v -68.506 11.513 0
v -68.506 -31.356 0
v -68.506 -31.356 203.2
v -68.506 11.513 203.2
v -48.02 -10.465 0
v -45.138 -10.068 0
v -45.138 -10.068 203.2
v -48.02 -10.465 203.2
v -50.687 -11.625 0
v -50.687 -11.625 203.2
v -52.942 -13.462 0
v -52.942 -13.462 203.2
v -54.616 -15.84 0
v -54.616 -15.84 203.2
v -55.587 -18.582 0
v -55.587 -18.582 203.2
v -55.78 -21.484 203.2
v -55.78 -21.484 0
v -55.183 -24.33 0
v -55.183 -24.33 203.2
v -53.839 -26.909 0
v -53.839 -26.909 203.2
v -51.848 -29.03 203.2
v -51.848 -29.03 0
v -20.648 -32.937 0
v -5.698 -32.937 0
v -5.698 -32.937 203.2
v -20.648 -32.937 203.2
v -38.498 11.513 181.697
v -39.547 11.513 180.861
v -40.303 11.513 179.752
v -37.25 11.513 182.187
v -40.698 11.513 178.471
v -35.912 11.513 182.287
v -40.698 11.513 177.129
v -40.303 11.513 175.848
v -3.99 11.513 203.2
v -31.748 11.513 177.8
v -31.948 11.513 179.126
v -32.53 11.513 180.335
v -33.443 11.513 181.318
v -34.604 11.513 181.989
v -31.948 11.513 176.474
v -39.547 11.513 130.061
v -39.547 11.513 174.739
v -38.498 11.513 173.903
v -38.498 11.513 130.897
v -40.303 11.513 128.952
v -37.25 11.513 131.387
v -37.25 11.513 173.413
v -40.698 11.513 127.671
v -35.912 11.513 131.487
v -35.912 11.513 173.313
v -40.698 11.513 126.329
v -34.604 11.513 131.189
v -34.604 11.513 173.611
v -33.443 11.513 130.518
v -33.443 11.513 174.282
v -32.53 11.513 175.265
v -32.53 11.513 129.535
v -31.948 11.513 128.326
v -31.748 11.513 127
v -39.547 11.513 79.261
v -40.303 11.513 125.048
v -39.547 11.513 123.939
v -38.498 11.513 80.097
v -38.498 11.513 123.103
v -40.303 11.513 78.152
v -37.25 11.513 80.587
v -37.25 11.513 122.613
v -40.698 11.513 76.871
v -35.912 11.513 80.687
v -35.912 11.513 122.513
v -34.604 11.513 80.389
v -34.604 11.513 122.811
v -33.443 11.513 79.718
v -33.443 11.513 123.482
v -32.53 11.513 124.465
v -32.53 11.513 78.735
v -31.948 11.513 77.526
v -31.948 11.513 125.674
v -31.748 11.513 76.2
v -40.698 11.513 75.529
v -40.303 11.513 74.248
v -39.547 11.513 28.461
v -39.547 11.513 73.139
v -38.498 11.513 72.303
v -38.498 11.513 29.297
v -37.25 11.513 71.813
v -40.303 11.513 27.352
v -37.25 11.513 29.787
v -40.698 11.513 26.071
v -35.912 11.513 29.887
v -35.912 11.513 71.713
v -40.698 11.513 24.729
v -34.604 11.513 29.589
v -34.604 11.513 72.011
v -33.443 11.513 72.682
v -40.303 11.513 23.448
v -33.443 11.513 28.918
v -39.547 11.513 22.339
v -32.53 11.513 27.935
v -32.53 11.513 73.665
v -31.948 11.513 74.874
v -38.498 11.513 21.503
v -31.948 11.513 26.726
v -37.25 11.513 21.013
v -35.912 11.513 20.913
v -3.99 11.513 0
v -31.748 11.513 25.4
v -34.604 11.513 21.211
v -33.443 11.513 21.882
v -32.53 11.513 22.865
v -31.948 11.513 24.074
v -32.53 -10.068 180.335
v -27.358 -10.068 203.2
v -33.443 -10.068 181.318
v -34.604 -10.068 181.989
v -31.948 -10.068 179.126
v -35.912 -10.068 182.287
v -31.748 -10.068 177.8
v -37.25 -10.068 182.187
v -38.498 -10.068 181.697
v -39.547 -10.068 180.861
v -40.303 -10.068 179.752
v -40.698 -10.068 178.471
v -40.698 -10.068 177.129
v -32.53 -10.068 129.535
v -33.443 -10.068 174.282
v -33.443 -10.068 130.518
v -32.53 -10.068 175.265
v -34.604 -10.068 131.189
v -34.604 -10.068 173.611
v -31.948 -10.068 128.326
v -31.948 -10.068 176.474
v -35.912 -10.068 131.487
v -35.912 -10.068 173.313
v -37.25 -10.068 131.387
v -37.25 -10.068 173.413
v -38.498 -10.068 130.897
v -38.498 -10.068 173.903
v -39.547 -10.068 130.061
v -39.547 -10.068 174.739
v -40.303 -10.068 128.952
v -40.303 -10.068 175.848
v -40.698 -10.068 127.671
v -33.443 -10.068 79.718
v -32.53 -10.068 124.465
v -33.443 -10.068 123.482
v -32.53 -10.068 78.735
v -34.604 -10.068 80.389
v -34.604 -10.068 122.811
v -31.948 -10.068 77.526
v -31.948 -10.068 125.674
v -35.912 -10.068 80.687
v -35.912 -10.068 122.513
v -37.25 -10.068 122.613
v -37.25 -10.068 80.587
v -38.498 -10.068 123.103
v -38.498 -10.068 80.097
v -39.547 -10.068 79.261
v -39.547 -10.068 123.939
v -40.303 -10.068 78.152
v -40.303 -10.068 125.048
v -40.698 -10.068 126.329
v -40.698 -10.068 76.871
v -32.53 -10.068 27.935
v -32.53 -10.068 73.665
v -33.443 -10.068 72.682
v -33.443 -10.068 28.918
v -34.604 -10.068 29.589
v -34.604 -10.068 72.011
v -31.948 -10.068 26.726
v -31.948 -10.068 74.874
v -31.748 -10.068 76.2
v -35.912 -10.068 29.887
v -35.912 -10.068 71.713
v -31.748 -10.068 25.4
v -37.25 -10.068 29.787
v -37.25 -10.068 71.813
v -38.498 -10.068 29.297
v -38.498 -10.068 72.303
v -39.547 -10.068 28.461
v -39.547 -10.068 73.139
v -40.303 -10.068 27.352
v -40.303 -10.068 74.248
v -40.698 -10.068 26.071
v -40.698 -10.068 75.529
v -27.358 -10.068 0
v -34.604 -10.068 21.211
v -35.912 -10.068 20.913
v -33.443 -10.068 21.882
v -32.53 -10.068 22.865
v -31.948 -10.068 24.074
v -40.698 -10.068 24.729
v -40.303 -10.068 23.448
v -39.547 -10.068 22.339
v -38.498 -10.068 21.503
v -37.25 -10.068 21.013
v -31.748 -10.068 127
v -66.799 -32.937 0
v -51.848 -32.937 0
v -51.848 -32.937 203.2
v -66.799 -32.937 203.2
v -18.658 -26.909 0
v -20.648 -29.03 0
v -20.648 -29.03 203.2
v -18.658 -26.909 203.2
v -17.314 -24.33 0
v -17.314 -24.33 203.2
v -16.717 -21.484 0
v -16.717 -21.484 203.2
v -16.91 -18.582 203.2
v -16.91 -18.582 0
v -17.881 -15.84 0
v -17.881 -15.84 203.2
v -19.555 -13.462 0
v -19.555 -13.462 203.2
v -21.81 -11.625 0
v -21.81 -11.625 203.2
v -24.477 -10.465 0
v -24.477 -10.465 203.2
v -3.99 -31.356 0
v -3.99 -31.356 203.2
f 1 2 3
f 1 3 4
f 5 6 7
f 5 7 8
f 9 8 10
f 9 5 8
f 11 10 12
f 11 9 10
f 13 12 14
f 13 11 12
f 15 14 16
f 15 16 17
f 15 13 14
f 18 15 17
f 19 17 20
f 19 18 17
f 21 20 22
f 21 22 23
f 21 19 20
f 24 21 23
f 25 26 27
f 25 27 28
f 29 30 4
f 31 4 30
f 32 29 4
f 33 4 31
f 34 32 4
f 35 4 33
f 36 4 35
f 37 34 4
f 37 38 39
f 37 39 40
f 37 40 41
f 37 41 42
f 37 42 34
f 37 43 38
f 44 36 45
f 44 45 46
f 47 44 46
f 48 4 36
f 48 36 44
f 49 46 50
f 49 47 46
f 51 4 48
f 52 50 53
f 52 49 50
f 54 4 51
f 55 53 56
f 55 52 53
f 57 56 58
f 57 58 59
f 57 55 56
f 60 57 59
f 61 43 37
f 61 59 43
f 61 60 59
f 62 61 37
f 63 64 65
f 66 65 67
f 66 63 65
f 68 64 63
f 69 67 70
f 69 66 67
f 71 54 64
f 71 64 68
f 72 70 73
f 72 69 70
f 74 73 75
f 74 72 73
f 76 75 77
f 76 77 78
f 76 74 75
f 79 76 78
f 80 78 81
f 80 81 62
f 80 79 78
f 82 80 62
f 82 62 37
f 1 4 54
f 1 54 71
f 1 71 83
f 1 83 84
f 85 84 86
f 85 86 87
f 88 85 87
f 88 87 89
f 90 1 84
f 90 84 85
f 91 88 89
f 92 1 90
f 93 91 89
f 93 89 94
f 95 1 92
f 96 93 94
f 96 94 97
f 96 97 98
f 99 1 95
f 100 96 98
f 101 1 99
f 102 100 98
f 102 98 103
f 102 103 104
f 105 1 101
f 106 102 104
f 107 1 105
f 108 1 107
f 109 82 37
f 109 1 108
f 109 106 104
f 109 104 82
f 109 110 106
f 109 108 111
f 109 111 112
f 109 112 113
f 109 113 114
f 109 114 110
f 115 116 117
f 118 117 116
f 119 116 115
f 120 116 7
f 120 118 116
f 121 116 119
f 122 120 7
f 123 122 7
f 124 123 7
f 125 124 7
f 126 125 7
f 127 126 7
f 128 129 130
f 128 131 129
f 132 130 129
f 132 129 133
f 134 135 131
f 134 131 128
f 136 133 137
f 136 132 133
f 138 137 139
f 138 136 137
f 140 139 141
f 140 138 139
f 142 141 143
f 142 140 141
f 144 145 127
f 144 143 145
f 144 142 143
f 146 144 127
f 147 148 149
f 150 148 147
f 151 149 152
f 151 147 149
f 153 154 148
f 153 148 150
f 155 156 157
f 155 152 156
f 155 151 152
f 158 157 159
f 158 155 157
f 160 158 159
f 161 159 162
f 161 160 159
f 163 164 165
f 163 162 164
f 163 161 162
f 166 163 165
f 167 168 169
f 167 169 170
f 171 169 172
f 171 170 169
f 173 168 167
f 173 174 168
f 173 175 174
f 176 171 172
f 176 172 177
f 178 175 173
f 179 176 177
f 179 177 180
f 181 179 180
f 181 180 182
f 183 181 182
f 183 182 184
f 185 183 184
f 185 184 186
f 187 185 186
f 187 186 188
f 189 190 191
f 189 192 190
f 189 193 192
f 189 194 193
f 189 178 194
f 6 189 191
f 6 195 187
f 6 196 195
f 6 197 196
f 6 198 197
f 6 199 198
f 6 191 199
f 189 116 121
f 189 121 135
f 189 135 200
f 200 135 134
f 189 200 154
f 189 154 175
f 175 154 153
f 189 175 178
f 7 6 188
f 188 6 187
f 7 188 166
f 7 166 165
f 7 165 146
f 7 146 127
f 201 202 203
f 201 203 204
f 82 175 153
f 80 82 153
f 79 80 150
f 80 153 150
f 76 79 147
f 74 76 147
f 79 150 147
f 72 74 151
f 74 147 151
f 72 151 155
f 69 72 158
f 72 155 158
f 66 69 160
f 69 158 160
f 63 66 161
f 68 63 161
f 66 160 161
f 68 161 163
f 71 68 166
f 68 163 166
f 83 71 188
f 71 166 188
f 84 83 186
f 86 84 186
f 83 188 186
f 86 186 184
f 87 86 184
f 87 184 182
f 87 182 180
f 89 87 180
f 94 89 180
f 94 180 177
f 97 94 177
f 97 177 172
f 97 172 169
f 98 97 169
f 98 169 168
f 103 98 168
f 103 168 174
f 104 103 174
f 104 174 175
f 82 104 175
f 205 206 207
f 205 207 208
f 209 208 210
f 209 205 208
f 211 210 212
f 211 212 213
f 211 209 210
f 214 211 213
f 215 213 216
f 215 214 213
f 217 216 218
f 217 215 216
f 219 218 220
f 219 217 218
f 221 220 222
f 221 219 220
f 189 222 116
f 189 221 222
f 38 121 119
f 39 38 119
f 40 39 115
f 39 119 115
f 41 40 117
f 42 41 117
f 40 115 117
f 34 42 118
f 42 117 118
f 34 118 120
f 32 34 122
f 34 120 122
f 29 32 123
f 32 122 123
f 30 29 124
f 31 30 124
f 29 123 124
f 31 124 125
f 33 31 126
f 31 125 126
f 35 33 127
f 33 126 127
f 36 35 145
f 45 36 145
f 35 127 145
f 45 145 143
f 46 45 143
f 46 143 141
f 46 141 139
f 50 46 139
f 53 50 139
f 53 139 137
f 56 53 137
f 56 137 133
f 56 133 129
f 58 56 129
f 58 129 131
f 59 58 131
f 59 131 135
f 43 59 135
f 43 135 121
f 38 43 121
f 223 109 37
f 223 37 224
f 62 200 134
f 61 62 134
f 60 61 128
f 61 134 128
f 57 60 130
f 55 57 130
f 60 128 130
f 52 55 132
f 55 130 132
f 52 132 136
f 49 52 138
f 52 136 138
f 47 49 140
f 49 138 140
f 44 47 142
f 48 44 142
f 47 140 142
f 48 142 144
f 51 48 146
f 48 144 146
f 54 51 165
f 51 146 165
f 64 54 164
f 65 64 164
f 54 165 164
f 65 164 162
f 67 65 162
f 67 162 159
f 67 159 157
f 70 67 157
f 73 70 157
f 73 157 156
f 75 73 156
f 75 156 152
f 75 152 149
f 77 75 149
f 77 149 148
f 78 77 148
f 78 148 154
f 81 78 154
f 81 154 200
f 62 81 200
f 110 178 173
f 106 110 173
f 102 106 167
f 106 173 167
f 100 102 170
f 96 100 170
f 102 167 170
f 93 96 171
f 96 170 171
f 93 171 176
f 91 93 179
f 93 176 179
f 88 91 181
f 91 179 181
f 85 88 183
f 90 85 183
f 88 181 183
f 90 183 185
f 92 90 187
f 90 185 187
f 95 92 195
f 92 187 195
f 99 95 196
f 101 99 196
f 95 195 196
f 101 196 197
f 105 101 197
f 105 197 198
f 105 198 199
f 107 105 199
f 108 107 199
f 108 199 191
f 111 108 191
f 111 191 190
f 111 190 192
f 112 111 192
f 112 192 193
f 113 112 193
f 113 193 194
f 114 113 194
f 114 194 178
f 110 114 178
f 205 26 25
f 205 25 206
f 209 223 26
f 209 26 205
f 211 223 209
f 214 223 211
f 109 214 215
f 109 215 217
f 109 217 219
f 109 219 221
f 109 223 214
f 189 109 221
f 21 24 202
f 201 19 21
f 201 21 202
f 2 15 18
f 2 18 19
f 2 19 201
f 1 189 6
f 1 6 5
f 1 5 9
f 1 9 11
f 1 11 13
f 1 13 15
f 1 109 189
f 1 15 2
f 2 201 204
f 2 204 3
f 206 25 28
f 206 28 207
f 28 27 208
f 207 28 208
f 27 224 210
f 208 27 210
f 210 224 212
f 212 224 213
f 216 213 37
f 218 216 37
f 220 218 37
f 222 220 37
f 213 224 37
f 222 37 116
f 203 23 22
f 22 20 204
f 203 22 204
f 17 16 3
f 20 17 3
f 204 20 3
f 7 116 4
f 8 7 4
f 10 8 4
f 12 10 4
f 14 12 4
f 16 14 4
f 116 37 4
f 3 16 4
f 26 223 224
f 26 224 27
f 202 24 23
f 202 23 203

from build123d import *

# Parameters (mm, degrees)
BASE_EXTRUDE_DEPTH           = 203.2
TAP_DRILL_FOR_M10X1_0_TAP2_D = 9
LPATTERN1_COUNT              = 4
LPATTERN1_PITCH              = 50.8


with BuildPart() as part:
    # Sketch1 → Base-Extrude (new body)
    with BuildSketch(Plane.XY):
        with BuildLine():
            Line((-51.848409542, -29.029859377), (-51.848409542, -32.936966461))
            Line((-51.848409542, -32.936966461), (-66.799126207, -32.936966461))
            Line((-66.799126207, -32.936966461), (-68.5063829, -31.355514763))
            Line((-68.5063829, -31.355514763), (-68.5063829, 11.513033539))
            Line((-68.5063829, 11.513033539), (-3.9903829, 11.513033539))
            Line((-3.9903829, 11.513033539), (-3.9903829, -31.355514763))
            Line((-3.9903829, -31.355514763), (-5.697639593, -32.936966461))
            Line((-5.697639593, -32.936966461), (-20.648356257, -32.936966461))
            Line((-20.648356257, -32.936966461), (-20.648356257, -29.029859377))
            ThreePointArc((-20.648356257, -29.029859377), (-17.301518569, -17.177491216), (-27.3583829, -10.068382033))
            Line((-27.3583829, -10.068382033), (-45.1383829, -10.068382033))
            ThreePointArc((-45.1383829, -10.068382033), (-55.19524723, -17.177491216), (-51.848409542, -29.029859377))
        make_face()
    extrude(amount=BASE_EXTRUDE_DEPTH)

    # Tap Drill for M10x1.0 Tap2 (through all)
    with Locations(Plane(origin=(0, 11.513033539, 0), x_dir=(-1, 0, 0), z_dir=(0, 1, 0))):
        with Locations((36.2483829, 177.8)):
            tap_drill_for_m10x1_0_tap2 = Hole(TAP_DRILL_FOR_M10X1_0_TAP2_D / 2)

    # LPattern1: Tap Drill for M10x1.0 Tap2 ×4
    with Locations(*[(0, 0, -i * LPATTERN1_PITCH) for i in range(1, LPATTERN1_COUNT)]):
        add(tap_drill_for_m10x1_0_tap2, mode=Mode.SUBTRACT)


solid = part.part
